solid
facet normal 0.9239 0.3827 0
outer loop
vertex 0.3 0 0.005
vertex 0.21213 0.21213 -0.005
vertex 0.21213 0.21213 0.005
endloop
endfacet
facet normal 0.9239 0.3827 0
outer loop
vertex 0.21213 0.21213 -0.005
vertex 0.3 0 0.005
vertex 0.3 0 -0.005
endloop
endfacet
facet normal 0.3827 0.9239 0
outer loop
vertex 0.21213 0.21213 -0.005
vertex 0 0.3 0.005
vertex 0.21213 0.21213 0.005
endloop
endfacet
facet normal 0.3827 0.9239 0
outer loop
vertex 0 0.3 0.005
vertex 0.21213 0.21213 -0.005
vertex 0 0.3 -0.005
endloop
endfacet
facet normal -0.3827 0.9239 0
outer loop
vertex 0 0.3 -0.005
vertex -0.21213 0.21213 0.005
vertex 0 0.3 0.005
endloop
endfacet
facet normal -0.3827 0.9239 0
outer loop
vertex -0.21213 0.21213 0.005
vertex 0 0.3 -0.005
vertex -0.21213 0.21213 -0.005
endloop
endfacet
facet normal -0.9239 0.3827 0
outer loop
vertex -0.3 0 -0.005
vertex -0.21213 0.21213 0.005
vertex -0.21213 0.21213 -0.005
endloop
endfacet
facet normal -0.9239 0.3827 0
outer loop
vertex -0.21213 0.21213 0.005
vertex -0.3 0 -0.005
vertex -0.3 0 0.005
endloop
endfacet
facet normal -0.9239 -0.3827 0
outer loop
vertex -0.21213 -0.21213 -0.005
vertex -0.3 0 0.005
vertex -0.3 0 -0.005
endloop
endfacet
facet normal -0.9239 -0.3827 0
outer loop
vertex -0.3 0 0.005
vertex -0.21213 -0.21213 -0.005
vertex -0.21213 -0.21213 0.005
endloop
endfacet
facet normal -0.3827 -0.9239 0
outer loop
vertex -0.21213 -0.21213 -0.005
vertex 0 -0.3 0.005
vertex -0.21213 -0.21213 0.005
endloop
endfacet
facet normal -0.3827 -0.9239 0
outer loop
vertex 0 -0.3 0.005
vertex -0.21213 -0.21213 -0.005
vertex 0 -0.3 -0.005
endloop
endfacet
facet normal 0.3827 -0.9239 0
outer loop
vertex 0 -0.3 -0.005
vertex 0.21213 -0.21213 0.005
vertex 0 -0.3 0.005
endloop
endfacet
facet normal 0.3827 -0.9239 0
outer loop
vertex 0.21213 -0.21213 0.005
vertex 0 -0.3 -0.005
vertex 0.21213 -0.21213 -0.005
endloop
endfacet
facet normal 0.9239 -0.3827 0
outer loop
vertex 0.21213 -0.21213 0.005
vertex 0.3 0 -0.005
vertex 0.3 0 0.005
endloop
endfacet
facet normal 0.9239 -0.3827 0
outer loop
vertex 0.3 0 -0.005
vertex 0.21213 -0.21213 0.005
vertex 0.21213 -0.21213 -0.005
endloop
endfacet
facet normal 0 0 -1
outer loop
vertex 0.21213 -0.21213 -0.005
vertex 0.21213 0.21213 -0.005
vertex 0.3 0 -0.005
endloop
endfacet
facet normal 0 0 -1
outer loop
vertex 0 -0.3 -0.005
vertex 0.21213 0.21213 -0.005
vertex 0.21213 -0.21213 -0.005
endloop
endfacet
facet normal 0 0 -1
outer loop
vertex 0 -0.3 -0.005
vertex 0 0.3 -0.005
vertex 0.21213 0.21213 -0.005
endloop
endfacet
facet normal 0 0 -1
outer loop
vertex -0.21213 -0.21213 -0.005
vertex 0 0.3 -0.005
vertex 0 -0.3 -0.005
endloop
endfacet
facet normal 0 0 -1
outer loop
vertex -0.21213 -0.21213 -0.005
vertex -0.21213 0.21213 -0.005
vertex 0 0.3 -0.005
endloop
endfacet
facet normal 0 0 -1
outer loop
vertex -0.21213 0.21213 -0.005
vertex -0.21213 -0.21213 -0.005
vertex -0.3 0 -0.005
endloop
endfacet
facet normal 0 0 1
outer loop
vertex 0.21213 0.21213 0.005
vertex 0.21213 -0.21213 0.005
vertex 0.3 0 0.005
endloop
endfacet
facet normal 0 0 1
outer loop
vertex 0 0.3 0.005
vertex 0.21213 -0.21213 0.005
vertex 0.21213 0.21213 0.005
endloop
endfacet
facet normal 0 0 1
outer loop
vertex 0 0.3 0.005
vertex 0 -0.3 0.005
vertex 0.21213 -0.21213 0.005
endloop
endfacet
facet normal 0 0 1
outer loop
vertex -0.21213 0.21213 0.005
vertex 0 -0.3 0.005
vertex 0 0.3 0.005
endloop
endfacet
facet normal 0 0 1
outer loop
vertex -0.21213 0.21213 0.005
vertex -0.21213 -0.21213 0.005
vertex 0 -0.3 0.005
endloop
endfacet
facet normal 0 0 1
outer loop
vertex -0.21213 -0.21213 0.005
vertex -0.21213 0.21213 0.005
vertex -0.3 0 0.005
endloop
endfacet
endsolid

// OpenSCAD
// file: lib.scad
function x(v) = v[0];
function y(v) = v[1];
function z(v) = v[2];
function add(v1,v2) = [ for (i = [ 0 : len(v1)-1 ]) v1[i] + v2[i] ];
function xv(d) = [d,0,0];
function yv(d) = [0,d,0];
function zv(d) = [0,0,d];

module box(v) { cube(size=v, center=true); }
module cyl(r1,r2,h) { cylinder(r1=r1, r2=r2, h=h, center=true); }

function grow(n,v) = [x(v)+n*2, y(v)+n*2, z(v)+n*2];

module rbox(v, radius=1) {
	cx = x(v)/2-radius;
	cy = y(v)/2-radius;
	cz = z(v)/2-radius;

	hull() {
		translate([cx,cy,cz]) sphere(r=radius);
		translate([cx,cy,-cz]) sphere(r=radius);
		translate([cx,-cy,cz]) sphere(r=radius);
		translate([cx,-cy,-cz]) sphere(r=radius);
		translate([-cx,cy,cz]) sphere(r=radius);
		translate([-cx,cy,-cz]) sphere(r=radius);
		translate([-cx,-cy,cz]) sphere(r=radius);
		translate([-cx,-cy,-cz]) sphere(r=radius);
	}
}

module fillet(r=1) {
  minkowski() {
    difference() {
      children();
      minkowski() {
        difference() {
          minkowski() {
            children();
            sphere(r=r);
          }
          children();
        }
        sphere(r=r);
      }
    }
    sphere(r=r);
  }
}
// main file
use <lib.scad>

module roll() {
	cyl(0.25, 0.25, 0.5);
}

module end() {
	cyl(0.3, 0.3, 0.01);
}

d = 8;

//roll($fn=d);
end($fn=d);
